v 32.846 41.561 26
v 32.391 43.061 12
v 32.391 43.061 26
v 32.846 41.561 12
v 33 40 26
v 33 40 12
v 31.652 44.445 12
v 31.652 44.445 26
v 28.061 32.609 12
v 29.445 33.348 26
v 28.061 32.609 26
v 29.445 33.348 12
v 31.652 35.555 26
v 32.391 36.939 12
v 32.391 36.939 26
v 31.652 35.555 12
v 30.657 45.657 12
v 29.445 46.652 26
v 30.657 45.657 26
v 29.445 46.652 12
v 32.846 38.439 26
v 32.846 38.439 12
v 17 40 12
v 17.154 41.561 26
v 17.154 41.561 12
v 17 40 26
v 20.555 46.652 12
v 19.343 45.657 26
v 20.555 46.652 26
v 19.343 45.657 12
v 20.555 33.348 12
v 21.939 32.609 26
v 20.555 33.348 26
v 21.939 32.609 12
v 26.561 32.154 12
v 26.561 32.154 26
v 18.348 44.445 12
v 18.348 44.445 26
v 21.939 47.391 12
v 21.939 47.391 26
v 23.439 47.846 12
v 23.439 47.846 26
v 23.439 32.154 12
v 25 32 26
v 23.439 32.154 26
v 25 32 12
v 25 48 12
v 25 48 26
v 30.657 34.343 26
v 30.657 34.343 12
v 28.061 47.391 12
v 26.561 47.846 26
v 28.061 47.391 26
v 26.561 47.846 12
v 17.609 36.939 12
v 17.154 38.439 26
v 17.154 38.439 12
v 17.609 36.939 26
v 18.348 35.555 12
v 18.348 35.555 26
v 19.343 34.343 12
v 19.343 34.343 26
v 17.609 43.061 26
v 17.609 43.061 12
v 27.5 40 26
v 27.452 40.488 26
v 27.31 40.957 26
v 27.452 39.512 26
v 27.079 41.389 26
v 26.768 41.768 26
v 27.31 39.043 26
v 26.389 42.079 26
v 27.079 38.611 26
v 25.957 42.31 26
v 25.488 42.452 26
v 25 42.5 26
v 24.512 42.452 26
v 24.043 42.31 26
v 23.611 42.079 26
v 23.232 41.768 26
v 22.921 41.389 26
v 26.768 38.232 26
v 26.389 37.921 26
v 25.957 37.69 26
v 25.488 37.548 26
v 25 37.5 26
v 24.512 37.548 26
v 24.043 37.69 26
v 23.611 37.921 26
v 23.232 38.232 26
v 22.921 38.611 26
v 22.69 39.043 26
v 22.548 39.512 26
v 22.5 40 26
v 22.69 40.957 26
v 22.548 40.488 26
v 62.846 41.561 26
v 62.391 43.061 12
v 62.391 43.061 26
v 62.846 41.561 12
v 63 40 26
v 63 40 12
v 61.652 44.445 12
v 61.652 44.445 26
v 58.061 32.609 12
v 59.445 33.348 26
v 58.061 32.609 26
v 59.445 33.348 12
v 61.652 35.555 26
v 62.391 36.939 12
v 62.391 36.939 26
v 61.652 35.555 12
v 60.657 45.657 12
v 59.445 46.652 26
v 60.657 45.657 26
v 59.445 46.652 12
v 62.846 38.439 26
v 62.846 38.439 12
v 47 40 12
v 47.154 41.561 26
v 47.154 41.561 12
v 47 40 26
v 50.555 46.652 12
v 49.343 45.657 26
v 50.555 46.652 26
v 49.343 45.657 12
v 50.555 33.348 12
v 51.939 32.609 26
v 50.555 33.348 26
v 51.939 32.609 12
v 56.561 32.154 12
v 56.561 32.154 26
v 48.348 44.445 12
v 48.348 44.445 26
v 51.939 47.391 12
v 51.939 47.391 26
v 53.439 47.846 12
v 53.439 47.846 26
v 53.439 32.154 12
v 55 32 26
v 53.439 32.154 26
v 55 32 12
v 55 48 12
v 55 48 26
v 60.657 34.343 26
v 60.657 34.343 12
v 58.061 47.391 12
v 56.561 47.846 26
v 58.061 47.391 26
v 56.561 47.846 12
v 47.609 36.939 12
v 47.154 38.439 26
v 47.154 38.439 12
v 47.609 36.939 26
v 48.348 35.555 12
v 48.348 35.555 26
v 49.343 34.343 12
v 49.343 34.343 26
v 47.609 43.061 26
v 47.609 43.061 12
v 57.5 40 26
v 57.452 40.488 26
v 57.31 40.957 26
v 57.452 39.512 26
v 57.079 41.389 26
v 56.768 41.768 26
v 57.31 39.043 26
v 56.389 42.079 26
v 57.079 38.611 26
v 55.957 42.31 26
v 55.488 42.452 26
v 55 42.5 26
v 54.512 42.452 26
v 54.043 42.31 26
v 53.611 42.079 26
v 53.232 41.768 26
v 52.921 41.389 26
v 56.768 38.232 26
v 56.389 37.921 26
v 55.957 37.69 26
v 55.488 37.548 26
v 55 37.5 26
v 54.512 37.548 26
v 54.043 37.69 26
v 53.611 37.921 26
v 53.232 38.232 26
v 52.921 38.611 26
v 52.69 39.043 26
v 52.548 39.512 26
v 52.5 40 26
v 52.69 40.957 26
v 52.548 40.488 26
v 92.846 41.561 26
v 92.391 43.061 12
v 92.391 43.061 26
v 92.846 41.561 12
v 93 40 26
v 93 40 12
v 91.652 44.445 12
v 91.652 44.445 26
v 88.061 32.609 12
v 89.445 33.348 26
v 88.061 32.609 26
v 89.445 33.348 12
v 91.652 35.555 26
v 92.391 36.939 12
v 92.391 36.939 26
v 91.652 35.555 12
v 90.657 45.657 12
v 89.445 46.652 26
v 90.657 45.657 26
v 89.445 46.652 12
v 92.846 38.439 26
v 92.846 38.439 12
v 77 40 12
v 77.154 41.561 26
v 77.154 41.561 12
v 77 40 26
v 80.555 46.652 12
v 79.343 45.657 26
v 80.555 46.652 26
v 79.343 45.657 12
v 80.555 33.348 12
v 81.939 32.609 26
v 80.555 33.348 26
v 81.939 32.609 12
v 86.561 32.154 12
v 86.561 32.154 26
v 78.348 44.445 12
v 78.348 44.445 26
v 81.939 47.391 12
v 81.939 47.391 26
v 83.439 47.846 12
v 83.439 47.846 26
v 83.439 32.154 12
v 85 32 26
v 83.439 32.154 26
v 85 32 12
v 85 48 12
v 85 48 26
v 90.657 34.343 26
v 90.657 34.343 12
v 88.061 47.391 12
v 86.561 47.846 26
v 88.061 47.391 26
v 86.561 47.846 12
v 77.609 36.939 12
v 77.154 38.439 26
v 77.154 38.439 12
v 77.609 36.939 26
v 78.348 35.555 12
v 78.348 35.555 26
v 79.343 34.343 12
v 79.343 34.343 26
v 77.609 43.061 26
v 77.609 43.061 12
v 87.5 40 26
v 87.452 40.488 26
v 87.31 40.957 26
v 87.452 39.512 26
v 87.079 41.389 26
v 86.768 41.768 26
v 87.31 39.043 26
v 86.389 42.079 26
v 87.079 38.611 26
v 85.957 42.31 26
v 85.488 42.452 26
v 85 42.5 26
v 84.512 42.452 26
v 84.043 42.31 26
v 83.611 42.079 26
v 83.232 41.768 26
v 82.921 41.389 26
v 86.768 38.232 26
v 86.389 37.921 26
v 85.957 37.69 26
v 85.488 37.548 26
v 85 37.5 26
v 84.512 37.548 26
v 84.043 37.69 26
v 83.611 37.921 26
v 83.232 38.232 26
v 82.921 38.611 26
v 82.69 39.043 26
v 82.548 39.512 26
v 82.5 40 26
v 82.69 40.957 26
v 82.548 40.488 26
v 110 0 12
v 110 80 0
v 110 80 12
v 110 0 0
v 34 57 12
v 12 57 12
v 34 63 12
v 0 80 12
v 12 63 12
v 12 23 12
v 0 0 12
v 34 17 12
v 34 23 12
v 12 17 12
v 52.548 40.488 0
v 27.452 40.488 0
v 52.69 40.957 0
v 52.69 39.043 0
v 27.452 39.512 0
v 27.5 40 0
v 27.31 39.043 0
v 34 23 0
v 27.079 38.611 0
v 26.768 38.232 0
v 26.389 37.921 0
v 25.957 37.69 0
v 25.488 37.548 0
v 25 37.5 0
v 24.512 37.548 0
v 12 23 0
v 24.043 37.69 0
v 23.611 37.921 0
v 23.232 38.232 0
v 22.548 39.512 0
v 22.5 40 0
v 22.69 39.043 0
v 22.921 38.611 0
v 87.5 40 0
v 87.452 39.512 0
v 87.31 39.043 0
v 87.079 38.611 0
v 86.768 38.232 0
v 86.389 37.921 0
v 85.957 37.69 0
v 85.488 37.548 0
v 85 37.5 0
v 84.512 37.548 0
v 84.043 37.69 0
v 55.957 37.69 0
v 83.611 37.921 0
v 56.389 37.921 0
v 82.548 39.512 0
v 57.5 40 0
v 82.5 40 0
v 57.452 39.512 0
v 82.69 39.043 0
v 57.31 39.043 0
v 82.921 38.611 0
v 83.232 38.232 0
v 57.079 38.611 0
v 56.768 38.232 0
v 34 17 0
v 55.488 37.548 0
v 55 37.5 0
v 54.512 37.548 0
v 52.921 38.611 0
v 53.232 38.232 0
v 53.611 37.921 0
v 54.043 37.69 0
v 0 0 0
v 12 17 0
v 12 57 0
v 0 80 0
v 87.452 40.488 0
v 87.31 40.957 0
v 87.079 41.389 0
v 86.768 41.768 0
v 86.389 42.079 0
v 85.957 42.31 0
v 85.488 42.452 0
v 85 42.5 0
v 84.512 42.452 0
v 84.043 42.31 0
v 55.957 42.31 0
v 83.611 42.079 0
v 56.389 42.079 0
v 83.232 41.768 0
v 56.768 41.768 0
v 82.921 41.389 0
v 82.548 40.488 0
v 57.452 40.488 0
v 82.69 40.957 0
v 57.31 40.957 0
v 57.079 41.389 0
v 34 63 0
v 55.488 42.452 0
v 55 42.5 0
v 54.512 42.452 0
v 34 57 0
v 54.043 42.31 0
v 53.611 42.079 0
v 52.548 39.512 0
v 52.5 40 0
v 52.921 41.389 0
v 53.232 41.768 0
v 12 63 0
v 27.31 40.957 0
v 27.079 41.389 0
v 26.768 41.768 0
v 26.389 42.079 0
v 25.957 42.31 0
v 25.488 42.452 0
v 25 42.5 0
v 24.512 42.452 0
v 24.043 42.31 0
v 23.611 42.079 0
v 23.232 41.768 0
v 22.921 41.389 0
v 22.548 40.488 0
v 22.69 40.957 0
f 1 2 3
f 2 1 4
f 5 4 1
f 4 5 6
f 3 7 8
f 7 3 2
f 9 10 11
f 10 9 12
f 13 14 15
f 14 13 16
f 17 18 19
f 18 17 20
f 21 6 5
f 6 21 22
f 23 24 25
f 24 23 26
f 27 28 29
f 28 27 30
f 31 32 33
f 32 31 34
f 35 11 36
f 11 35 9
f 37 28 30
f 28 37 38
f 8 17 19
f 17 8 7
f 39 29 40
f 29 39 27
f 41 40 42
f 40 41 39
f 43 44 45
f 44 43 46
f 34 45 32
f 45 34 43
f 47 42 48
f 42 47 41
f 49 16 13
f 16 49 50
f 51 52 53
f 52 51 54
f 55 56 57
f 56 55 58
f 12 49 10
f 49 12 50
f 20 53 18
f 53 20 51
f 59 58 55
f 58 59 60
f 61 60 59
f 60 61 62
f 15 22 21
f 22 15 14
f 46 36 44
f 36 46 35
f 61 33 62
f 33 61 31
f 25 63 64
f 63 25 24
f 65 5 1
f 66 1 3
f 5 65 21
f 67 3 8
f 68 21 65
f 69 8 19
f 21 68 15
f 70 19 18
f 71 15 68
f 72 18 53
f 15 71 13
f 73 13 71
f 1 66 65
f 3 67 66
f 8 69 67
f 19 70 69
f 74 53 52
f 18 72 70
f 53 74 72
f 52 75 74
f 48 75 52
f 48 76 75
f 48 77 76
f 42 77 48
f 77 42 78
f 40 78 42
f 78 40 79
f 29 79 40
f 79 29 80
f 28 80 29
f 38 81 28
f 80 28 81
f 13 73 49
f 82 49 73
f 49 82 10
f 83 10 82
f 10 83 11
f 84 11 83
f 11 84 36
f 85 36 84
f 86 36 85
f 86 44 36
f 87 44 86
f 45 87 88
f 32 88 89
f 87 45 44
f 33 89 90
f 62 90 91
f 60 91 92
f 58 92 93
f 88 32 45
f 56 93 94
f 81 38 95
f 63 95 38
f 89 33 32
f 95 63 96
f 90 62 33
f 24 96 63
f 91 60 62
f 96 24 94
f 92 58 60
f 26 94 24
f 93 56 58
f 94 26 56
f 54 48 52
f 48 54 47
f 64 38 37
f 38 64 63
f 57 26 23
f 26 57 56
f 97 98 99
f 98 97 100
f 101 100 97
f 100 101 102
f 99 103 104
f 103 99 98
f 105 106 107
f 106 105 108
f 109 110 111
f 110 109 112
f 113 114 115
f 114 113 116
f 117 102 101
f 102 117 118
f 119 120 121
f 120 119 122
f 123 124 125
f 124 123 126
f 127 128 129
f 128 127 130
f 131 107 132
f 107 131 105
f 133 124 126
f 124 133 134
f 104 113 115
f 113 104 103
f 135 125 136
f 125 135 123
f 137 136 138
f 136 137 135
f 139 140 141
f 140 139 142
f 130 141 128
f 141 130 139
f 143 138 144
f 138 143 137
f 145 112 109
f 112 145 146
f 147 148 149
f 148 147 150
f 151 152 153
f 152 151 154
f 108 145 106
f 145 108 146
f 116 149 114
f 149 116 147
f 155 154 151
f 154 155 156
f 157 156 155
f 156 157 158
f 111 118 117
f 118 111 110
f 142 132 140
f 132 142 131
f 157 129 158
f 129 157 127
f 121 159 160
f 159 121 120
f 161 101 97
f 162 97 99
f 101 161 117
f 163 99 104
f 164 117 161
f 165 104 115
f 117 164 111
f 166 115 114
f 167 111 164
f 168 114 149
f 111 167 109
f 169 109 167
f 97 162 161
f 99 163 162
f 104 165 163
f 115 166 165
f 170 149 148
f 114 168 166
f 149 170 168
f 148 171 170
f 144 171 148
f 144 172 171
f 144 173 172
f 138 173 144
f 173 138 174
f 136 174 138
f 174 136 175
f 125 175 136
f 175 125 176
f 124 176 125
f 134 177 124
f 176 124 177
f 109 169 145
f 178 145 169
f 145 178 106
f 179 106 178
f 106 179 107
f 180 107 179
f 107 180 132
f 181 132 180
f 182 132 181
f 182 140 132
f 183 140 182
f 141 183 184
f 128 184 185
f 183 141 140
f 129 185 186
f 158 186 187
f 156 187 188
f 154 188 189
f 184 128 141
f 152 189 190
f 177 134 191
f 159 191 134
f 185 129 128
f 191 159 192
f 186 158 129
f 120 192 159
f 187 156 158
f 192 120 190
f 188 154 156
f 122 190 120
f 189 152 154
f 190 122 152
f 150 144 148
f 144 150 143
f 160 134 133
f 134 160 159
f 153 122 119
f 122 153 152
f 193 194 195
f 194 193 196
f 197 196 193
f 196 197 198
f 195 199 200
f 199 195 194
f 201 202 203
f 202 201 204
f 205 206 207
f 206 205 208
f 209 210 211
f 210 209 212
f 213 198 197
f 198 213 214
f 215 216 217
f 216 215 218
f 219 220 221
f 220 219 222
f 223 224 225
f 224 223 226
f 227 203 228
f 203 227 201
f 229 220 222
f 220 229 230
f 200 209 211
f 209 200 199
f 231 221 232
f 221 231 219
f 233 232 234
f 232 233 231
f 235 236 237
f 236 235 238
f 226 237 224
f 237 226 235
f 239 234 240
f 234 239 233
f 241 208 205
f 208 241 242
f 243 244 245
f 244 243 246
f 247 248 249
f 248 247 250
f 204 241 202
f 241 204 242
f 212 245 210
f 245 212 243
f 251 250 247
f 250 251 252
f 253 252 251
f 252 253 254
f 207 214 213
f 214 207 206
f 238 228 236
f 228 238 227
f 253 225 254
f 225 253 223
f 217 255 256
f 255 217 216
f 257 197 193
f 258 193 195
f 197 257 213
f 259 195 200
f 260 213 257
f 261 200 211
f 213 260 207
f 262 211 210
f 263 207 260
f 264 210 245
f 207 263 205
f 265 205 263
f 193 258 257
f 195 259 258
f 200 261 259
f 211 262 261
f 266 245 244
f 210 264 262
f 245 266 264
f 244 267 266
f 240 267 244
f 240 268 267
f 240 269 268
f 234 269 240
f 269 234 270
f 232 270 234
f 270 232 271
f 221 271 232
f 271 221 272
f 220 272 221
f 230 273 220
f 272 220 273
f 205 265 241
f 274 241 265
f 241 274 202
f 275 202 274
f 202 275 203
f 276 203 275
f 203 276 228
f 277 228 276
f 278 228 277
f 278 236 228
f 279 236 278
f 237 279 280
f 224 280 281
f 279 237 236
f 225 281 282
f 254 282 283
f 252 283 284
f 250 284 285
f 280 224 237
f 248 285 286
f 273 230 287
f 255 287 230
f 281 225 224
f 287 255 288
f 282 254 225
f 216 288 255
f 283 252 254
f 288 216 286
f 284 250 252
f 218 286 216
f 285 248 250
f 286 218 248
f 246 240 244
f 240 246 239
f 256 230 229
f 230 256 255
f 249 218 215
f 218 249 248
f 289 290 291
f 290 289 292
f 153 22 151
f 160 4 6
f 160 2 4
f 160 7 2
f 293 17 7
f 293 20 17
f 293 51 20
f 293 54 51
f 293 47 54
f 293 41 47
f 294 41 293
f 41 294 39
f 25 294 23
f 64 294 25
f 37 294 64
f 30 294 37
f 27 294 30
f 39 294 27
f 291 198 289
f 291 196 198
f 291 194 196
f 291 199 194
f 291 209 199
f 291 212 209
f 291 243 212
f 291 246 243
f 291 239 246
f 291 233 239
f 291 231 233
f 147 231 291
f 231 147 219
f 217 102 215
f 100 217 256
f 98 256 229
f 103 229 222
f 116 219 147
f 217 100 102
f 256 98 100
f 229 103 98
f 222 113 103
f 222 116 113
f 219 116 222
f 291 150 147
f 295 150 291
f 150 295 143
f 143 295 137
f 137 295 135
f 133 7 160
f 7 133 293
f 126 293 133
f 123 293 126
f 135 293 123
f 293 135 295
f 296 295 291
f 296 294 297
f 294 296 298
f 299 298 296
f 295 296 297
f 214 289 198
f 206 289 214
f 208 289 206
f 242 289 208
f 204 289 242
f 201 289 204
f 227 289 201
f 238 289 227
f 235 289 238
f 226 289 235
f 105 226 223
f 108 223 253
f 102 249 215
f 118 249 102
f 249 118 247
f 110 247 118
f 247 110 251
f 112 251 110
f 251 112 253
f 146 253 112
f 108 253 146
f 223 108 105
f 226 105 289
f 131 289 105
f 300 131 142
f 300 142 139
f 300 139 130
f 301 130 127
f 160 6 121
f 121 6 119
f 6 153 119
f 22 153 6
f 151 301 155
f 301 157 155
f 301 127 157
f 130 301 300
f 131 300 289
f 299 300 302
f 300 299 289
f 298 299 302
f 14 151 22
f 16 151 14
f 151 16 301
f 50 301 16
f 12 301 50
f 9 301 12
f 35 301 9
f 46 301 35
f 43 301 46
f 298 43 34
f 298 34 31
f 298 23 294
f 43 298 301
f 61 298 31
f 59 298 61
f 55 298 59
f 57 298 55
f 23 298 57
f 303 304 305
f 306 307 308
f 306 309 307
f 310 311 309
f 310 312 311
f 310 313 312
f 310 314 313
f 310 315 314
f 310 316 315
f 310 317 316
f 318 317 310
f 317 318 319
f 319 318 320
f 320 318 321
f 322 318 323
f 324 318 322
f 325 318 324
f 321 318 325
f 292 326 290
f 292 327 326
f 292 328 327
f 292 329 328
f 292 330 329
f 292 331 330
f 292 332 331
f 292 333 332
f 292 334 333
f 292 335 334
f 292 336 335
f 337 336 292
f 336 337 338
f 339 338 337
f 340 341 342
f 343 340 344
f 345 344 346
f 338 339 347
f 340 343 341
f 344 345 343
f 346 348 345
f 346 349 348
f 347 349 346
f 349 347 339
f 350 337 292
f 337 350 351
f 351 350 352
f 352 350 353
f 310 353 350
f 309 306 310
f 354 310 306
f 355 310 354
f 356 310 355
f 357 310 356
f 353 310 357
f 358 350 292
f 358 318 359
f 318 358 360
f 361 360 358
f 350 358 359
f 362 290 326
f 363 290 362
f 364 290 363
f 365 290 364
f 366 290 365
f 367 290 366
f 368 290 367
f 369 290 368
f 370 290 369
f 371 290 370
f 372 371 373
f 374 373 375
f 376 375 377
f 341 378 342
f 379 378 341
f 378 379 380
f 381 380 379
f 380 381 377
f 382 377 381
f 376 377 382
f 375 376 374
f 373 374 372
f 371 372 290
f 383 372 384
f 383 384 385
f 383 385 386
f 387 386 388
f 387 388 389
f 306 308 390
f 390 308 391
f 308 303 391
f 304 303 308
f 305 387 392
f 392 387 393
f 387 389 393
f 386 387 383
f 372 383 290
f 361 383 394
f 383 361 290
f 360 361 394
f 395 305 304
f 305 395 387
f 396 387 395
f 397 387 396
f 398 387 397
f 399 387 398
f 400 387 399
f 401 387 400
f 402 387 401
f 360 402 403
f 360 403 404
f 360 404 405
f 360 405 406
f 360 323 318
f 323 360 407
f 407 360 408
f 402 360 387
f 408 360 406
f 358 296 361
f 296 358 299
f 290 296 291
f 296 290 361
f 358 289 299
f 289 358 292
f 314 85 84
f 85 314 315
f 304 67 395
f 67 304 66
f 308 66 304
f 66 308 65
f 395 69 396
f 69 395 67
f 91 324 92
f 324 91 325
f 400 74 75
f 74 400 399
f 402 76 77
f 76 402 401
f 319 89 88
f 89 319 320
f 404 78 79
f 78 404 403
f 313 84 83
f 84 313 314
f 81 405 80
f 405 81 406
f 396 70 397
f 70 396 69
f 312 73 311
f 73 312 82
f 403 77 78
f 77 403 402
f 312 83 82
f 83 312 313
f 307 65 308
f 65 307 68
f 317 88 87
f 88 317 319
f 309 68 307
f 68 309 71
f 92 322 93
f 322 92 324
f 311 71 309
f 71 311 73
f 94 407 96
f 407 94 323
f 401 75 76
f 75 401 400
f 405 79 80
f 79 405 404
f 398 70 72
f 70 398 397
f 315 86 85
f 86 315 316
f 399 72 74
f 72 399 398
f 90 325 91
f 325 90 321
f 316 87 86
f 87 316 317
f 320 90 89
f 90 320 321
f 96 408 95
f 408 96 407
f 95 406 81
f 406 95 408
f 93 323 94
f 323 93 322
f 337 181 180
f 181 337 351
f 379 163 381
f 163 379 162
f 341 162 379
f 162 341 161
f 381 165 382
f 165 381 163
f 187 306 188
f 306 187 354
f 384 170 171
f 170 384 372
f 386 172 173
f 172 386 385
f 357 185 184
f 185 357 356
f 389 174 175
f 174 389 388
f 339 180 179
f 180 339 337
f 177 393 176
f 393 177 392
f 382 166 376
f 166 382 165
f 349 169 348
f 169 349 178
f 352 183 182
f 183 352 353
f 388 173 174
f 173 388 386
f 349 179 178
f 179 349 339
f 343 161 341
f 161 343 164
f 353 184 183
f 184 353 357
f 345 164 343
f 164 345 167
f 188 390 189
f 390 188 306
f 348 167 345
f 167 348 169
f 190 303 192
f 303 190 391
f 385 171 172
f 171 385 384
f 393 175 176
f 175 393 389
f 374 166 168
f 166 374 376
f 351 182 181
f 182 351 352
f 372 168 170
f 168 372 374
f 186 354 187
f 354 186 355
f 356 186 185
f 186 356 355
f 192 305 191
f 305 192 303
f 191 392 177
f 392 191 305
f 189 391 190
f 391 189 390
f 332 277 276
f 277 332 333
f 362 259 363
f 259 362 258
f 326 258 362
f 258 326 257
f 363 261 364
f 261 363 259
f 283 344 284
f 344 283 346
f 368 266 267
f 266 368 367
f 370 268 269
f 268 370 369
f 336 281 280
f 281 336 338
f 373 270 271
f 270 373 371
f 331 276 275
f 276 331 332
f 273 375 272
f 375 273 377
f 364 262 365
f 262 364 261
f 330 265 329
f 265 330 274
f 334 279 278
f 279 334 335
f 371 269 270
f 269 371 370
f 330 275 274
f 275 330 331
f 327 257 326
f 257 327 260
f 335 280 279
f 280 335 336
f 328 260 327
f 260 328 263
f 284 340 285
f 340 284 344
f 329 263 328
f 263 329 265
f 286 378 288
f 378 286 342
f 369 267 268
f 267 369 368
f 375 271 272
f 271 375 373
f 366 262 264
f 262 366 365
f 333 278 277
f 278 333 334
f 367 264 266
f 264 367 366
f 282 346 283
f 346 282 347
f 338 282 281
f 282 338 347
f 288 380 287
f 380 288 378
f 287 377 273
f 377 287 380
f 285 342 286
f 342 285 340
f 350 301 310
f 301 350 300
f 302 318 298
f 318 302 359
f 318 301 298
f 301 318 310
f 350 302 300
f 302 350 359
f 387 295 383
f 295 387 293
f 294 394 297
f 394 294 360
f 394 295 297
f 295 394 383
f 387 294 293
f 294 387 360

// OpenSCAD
$fn = 32;

// ----------------------------------------------------------------------
// Drill jig: three_boss_slot jig
// ----------------------------------------------------------------------

// --- parameters (mm) ---
plate_l = 110;            // plate length, X
plate_w = 80;             // plate width, Y
plate_t = 12;             // plate thickness
boss_d = 16;              // guide boss diameter
boss_h = 15;              // boss height above the plate
guide_d = 5;              // guide hole diameter
boss_pitch = 30;          // boss pitch
slot_w = 6;               // clamp slot width
slot_l = 22;              // clamp slot length
slot_x = 12;              // slot start X

n_boss = 3;  // guide bosses
boss_x0 = (plate_l - (n_boss - 1) * boss_pitch) / 2;  // first boss X
boss_top = plate_t - 1 + boss_h;  // boss crown height
total_h = boss_top;  // overall height

difference() {
  union() {
  cube([plate_l, plate_w, plate_t]);
  for (i = [0 : n_boss - 1])
    translate([boss_x0 + i * boss_pitch, plate_w / 2, plate_t - 1])
      cylinder(h = boss_h, d = boss_d);
  }
  for (i = [0 : n_boss - 1])
    translate([boss_x0 + i * boss_pitch, plate_w / 2, -1])
      cylinder(h = plate_t + boss_h, d = guide_d);
  for (cy = [plate_w * 0.25, plate_w * 0.75])
    translate([slot_x, cy - slot_w / 2, -1])
      cube([slot_l, slot_w, plate_t + 2]);
}
